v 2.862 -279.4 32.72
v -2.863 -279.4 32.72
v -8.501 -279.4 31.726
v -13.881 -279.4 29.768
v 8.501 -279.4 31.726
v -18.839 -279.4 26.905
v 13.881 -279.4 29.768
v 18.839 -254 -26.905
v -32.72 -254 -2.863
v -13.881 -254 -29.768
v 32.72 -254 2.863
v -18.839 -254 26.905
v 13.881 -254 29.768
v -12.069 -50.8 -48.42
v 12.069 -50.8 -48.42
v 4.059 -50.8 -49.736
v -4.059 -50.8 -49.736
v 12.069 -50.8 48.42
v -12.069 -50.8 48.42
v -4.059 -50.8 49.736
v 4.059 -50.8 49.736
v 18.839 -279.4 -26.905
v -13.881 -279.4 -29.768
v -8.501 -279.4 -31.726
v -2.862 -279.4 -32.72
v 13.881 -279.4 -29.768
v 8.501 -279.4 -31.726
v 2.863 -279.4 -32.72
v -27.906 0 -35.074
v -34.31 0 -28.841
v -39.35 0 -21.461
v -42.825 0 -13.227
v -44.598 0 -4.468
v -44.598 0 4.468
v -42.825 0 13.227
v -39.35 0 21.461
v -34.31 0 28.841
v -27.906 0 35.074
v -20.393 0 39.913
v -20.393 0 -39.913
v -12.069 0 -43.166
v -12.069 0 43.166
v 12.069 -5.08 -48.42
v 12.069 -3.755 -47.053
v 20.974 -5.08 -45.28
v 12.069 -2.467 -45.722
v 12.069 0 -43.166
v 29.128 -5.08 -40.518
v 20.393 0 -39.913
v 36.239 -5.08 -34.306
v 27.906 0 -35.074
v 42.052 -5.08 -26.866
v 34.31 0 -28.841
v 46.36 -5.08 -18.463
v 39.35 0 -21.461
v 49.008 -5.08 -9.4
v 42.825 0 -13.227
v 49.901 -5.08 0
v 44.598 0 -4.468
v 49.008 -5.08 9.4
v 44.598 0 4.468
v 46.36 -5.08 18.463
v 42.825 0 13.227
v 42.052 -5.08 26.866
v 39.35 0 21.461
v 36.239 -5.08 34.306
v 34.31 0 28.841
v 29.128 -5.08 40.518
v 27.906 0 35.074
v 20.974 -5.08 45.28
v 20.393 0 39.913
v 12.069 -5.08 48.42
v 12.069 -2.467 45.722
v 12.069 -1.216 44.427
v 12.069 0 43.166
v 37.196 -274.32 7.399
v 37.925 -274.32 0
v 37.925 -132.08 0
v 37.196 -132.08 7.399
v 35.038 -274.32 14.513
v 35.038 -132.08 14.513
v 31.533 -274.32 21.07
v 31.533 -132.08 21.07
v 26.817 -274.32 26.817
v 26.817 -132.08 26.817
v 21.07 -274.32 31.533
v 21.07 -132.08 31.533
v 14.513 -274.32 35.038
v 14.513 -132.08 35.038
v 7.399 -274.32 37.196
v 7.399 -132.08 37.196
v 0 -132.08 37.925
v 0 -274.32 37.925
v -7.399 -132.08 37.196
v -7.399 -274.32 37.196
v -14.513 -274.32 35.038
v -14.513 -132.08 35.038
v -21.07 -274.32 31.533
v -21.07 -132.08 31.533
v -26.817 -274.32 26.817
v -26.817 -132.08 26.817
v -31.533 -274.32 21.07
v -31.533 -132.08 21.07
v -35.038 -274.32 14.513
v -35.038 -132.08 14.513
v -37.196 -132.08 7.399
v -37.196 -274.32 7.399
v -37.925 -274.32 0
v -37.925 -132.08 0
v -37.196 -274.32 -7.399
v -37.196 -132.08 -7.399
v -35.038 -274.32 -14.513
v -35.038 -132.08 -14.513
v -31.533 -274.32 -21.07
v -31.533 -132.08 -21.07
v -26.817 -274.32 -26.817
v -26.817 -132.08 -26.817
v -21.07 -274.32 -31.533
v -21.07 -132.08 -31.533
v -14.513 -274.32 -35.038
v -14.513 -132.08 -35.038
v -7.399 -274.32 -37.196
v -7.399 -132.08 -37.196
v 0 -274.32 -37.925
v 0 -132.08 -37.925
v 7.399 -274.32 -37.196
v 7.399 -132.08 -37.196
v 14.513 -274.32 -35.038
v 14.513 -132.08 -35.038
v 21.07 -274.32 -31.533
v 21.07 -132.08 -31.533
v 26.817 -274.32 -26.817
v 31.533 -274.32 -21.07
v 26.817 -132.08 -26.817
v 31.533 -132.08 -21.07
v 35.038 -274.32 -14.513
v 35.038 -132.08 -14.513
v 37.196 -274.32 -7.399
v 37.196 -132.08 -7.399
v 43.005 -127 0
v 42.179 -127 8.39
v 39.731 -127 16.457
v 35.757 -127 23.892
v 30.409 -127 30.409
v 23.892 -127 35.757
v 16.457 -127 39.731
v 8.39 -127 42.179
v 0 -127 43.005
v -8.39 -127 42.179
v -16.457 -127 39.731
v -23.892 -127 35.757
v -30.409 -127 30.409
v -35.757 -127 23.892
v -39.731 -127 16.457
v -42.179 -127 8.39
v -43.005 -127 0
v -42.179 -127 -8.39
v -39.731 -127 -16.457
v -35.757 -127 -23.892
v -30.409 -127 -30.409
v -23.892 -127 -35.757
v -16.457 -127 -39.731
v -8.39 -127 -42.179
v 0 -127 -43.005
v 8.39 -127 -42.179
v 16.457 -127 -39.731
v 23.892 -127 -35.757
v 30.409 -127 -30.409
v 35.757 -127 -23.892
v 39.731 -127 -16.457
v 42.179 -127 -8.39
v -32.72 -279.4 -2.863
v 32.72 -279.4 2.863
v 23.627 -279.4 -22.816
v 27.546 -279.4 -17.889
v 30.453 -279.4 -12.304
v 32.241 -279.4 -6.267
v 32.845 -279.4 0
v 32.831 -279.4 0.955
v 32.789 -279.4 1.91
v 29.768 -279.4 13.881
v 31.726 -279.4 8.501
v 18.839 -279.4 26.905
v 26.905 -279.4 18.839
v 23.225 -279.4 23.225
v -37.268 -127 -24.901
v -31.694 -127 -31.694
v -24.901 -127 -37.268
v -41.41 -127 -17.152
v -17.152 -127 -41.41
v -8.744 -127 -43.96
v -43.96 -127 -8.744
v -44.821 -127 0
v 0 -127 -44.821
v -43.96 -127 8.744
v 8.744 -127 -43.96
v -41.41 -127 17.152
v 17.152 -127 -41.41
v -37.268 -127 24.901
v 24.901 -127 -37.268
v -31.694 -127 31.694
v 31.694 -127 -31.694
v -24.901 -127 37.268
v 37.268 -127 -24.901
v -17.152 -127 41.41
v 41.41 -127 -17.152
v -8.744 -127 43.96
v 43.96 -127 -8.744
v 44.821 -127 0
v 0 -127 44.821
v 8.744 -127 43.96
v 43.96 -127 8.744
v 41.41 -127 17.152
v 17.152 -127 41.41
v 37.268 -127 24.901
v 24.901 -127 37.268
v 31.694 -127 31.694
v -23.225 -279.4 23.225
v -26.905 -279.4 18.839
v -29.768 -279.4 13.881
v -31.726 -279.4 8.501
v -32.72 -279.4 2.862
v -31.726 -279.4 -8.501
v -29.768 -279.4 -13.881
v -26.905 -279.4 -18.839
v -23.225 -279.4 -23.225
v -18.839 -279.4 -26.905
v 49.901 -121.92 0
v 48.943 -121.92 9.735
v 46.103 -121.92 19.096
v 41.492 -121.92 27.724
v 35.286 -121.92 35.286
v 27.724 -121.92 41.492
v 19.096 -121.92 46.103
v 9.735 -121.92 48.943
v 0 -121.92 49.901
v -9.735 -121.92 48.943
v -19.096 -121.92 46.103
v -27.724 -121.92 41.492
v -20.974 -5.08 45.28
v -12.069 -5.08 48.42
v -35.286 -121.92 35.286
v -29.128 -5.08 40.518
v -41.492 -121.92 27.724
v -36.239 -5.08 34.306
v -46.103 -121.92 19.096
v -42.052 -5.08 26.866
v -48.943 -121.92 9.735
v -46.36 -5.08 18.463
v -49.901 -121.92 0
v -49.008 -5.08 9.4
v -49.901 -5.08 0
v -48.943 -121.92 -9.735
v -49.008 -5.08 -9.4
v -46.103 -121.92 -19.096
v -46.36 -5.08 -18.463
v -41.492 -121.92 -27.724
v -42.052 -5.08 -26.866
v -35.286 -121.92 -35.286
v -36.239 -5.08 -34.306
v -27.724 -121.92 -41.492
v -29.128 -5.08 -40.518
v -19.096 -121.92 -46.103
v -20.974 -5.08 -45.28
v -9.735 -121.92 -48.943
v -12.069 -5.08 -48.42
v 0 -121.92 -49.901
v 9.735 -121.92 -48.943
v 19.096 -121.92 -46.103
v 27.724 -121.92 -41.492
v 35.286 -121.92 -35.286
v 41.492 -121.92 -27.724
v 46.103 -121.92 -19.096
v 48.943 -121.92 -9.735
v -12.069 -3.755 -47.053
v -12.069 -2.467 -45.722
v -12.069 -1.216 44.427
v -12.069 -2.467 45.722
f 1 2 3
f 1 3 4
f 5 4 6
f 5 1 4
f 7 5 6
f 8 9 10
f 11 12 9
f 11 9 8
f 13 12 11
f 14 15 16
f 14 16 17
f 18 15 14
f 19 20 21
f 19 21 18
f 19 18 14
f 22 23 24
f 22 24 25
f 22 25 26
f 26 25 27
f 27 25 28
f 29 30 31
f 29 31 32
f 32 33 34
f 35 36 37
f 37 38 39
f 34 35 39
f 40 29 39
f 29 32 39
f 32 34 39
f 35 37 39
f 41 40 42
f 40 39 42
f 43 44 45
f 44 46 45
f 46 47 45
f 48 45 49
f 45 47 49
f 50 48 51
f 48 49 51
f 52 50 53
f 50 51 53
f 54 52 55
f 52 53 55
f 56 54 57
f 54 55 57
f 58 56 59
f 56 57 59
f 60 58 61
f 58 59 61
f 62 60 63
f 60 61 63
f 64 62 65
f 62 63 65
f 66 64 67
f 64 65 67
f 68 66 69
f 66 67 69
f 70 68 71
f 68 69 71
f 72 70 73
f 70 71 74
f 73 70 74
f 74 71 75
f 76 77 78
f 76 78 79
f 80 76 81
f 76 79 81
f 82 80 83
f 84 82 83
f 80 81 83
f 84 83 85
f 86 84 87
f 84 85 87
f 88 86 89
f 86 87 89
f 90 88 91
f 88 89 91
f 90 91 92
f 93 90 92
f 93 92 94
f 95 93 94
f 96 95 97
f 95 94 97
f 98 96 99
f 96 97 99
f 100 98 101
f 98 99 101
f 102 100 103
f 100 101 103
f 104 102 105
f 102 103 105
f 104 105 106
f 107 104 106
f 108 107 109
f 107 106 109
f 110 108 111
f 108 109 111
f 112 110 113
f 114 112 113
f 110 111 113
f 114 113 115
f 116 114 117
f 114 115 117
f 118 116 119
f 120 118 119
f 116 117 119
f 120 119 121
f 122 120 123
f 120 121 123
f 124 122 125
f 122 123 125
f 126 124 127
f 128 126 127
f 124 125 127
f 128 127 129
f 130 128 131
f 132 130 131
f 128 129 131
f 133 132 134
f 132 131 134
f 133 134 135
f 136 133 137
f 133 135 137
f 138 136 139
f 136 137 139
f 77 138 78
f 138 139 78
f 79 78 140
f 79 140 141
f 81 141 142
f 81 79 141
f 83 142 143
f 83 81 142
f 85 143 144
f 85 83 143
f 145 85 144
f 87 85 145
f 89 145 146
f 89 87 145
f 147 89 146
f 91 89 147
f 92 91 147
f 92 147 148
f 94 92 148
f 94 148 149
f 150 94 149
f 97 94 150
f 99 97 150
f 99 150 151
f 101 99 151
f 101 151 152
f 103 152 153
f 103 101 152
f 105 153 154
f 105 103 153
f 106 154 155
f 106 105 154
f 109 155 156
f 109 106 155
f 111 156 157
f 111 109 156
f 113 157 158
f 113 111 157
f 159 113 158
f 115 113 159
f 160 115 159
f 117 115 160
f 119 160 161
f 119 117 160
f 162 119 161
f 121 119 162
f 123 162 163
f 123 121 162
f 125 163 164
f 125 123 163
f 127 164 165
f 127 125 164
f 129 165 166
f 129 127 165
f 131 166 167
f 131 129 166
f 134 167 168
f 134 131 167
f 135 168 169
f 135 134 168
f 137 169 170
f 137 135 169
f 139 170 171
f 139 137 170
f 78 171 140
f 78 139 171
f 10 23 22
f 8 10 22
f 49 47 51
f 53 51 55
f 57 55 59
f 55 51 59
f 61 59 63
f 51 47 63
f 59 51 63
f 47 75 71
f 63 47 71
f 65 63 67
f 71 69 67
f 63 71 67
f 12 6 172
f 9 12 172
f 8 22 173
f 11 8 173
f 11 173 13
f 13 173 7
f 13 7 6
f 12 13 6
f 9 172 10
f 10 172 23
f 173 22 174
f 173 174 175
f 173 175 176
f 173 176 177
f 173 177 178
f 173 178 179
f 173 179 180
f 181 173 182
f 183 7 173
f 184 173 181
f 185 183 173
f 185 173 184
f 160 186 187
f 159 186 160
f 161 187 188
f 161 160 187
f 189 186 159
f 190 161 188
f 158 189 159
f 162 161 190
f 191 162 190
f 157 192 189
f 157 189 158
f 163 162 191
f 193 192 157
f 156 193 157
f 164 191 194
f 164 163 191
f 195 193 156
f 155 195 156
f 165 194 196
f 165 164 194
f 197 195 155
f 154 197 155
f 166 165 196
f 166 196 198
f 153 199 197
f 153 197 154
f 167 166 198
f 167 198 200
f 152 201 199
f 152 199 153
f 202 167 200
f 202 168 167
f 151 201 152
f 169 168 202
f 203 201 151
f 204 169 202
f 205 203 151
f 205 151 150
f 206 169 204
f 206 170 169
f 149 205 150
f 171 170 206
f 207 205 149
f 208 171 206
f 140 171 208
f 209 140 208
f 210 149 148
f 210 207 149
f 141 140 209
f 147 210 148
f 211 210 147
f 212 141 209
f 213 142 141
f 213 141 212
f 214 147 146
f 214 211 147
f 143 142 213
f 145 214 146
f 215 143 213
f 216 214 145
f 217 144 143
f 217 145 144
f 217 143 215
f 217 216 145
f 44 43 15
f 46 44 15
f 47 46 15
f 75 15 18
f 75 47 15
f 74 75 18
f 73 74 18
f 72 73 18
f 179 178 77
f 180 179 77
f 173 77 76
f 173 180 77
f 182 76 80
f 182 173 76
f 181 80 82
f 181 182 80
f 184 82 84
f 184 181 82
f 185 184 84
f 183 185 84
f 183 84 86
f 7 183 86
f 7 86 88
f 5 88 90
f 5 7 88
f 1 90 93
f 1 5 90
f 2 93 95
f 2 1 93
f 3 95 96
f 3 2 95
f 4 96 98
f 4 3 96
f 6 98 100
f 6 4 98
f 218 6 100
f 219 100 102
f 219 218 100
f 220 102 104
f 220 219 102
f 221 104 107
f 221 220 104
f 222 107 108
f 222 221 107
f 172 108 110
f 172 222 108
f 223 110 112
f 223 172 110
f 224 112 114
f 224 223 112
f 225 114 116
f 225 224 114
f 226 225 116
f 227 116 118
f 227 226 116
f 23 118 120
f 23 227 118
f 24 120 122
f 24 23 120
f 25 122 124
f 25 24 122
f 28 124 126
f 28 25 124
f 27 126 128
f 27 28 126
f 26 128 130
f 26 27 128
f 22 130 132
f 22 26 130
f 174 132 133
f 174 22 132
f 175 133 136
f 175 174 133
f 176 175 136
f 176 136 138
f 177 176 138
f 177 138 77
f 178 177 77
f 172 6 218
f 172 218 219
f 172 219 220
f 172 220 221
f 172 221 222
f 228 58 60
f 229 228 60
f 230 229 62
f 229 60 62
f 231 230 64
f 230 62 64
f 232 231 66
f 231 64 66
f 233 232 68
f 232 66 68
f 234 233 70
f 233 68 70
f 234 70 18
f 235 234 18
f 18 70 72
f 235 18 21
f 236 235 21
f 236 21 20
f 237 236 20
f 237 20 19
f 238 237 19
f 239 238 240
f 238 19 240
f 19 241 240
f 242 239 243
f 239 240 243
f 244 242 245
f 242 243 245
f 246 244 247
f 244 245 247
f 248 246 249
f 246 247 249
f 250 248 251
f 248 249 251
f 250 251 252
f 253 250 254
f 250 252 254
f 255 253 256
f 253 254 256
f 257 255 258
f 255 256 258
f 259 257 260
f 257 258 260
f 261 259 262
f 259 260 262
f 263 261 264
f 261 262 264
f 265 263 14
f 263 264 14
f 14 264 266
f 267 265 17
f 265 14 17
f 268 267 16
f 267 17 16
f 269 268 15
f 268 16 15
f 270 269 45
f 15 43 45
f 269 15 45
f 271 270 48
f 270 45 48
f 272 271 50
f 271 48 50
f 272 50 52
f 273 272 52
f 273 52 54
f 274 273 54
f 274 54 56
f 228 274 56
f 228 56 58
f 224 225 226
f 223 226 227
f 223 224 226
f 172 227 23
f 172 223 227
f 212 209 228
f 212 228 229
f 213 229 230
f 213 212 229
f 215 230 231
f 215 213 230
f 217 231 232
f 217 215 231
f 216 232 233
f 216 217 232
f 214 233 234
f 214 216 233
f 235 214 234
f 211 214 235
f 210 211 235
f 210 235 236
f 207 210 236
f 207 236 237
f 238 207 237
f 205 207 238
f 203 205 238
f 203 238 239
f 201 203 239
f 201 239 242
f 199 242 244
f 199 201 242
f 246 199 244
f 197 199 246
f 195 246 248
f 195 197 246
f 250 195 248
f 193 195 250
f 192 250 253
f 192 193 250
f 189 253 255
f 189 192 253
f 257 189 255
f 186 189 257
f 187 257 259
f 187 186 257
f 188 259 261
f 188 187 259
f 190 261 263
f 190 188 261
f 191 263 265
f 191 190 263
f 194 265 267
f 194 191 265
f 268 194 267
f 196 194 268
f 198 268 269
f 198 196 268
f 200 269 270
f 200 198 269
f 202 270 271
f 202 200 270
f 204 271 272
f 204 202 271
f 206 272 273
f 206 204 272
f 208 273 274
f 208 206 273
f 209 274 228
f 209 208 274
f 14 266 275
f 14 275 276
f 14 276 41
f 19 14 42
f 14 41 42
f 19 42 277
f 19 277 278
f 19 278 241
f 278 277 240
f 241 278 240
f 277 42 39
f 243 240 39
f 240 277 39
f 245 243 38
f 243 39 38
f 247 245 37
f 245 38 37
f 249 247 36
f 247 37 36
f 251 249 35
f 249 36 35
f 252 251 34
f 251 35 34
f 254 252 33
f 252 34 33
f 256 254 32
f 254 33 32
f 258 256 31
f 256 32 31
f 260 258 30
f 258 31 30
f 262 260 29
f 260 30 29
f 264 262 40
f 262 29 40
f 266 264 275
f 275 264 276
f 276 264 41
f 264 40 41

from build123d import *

# Parameters (mm, degrees)
F0_R      = 49.9014426293
F1_DEPTH  = 127
F2_R      = 37.9248906149
F3_DEPTH  = 152.4
F4_SIZE   = 5.08
F6_DEPTH  = 25.4
F9_W      = 24.138873443
F9_H      = 129.7791451216
F10_DEPTH = 50.8


# Not quite as in the source:
# - the program builds the solid bodies; features that only make, move or delete a surface that nothing else refers to are left out


with BuildPart() as f1:
    # F0 (on Front) → F1 (new body)
    with BuildSketch(Plane.XZ):
        Circle(F0_R)
    extrude(amount=F1_DEPTH)

    # F2 (on face) → F3 (join)
    with BuildSketch(Plane.XZ.offset(127)):
        Circle(F2_R)
    extrude(amount=F3_DEPTH)

    # F4
    f4_edges = [f1.edges().sort_by_distance(p)[0] for p in [
        (-49.901443, -127, 0),
        (-37.924891, -127, 0),
        (-37.924891, -279.4, 0),
        (-49.901443, 0, 0),
    ]]
    chamfer(f4_edges, length=F4_SIZE)

    # F5 (on face) → F6 (cut)
    with BuildSketch(Plane.XZ.offset(279.4)):
        Polygon((-13.8807385989, -29.7676323455), (18.8391565222, -26.9048884227), (32.7198951211, 2.8627439228), (13.8807385989, 29.7676323455), (-18.8391565222, 26.9048884227), (-32.7198951211, -2.8627439228), align=None)
    extrude(amount=-F6_DEPTH, mode=Mode.SUBTRACT)

    # F9 (on face) → F10 (cut)
    with BuildSketch(Plane(origin=(0, 0, 0), x_dir=(-1, 0, 0), z_dir=(0, 1, 0))):
        Rectangle(F9_W, F9_H)
    extrude(amount=-F10_DEPTH, mode=Mode.SUBTRACT)


solid = f1.part
